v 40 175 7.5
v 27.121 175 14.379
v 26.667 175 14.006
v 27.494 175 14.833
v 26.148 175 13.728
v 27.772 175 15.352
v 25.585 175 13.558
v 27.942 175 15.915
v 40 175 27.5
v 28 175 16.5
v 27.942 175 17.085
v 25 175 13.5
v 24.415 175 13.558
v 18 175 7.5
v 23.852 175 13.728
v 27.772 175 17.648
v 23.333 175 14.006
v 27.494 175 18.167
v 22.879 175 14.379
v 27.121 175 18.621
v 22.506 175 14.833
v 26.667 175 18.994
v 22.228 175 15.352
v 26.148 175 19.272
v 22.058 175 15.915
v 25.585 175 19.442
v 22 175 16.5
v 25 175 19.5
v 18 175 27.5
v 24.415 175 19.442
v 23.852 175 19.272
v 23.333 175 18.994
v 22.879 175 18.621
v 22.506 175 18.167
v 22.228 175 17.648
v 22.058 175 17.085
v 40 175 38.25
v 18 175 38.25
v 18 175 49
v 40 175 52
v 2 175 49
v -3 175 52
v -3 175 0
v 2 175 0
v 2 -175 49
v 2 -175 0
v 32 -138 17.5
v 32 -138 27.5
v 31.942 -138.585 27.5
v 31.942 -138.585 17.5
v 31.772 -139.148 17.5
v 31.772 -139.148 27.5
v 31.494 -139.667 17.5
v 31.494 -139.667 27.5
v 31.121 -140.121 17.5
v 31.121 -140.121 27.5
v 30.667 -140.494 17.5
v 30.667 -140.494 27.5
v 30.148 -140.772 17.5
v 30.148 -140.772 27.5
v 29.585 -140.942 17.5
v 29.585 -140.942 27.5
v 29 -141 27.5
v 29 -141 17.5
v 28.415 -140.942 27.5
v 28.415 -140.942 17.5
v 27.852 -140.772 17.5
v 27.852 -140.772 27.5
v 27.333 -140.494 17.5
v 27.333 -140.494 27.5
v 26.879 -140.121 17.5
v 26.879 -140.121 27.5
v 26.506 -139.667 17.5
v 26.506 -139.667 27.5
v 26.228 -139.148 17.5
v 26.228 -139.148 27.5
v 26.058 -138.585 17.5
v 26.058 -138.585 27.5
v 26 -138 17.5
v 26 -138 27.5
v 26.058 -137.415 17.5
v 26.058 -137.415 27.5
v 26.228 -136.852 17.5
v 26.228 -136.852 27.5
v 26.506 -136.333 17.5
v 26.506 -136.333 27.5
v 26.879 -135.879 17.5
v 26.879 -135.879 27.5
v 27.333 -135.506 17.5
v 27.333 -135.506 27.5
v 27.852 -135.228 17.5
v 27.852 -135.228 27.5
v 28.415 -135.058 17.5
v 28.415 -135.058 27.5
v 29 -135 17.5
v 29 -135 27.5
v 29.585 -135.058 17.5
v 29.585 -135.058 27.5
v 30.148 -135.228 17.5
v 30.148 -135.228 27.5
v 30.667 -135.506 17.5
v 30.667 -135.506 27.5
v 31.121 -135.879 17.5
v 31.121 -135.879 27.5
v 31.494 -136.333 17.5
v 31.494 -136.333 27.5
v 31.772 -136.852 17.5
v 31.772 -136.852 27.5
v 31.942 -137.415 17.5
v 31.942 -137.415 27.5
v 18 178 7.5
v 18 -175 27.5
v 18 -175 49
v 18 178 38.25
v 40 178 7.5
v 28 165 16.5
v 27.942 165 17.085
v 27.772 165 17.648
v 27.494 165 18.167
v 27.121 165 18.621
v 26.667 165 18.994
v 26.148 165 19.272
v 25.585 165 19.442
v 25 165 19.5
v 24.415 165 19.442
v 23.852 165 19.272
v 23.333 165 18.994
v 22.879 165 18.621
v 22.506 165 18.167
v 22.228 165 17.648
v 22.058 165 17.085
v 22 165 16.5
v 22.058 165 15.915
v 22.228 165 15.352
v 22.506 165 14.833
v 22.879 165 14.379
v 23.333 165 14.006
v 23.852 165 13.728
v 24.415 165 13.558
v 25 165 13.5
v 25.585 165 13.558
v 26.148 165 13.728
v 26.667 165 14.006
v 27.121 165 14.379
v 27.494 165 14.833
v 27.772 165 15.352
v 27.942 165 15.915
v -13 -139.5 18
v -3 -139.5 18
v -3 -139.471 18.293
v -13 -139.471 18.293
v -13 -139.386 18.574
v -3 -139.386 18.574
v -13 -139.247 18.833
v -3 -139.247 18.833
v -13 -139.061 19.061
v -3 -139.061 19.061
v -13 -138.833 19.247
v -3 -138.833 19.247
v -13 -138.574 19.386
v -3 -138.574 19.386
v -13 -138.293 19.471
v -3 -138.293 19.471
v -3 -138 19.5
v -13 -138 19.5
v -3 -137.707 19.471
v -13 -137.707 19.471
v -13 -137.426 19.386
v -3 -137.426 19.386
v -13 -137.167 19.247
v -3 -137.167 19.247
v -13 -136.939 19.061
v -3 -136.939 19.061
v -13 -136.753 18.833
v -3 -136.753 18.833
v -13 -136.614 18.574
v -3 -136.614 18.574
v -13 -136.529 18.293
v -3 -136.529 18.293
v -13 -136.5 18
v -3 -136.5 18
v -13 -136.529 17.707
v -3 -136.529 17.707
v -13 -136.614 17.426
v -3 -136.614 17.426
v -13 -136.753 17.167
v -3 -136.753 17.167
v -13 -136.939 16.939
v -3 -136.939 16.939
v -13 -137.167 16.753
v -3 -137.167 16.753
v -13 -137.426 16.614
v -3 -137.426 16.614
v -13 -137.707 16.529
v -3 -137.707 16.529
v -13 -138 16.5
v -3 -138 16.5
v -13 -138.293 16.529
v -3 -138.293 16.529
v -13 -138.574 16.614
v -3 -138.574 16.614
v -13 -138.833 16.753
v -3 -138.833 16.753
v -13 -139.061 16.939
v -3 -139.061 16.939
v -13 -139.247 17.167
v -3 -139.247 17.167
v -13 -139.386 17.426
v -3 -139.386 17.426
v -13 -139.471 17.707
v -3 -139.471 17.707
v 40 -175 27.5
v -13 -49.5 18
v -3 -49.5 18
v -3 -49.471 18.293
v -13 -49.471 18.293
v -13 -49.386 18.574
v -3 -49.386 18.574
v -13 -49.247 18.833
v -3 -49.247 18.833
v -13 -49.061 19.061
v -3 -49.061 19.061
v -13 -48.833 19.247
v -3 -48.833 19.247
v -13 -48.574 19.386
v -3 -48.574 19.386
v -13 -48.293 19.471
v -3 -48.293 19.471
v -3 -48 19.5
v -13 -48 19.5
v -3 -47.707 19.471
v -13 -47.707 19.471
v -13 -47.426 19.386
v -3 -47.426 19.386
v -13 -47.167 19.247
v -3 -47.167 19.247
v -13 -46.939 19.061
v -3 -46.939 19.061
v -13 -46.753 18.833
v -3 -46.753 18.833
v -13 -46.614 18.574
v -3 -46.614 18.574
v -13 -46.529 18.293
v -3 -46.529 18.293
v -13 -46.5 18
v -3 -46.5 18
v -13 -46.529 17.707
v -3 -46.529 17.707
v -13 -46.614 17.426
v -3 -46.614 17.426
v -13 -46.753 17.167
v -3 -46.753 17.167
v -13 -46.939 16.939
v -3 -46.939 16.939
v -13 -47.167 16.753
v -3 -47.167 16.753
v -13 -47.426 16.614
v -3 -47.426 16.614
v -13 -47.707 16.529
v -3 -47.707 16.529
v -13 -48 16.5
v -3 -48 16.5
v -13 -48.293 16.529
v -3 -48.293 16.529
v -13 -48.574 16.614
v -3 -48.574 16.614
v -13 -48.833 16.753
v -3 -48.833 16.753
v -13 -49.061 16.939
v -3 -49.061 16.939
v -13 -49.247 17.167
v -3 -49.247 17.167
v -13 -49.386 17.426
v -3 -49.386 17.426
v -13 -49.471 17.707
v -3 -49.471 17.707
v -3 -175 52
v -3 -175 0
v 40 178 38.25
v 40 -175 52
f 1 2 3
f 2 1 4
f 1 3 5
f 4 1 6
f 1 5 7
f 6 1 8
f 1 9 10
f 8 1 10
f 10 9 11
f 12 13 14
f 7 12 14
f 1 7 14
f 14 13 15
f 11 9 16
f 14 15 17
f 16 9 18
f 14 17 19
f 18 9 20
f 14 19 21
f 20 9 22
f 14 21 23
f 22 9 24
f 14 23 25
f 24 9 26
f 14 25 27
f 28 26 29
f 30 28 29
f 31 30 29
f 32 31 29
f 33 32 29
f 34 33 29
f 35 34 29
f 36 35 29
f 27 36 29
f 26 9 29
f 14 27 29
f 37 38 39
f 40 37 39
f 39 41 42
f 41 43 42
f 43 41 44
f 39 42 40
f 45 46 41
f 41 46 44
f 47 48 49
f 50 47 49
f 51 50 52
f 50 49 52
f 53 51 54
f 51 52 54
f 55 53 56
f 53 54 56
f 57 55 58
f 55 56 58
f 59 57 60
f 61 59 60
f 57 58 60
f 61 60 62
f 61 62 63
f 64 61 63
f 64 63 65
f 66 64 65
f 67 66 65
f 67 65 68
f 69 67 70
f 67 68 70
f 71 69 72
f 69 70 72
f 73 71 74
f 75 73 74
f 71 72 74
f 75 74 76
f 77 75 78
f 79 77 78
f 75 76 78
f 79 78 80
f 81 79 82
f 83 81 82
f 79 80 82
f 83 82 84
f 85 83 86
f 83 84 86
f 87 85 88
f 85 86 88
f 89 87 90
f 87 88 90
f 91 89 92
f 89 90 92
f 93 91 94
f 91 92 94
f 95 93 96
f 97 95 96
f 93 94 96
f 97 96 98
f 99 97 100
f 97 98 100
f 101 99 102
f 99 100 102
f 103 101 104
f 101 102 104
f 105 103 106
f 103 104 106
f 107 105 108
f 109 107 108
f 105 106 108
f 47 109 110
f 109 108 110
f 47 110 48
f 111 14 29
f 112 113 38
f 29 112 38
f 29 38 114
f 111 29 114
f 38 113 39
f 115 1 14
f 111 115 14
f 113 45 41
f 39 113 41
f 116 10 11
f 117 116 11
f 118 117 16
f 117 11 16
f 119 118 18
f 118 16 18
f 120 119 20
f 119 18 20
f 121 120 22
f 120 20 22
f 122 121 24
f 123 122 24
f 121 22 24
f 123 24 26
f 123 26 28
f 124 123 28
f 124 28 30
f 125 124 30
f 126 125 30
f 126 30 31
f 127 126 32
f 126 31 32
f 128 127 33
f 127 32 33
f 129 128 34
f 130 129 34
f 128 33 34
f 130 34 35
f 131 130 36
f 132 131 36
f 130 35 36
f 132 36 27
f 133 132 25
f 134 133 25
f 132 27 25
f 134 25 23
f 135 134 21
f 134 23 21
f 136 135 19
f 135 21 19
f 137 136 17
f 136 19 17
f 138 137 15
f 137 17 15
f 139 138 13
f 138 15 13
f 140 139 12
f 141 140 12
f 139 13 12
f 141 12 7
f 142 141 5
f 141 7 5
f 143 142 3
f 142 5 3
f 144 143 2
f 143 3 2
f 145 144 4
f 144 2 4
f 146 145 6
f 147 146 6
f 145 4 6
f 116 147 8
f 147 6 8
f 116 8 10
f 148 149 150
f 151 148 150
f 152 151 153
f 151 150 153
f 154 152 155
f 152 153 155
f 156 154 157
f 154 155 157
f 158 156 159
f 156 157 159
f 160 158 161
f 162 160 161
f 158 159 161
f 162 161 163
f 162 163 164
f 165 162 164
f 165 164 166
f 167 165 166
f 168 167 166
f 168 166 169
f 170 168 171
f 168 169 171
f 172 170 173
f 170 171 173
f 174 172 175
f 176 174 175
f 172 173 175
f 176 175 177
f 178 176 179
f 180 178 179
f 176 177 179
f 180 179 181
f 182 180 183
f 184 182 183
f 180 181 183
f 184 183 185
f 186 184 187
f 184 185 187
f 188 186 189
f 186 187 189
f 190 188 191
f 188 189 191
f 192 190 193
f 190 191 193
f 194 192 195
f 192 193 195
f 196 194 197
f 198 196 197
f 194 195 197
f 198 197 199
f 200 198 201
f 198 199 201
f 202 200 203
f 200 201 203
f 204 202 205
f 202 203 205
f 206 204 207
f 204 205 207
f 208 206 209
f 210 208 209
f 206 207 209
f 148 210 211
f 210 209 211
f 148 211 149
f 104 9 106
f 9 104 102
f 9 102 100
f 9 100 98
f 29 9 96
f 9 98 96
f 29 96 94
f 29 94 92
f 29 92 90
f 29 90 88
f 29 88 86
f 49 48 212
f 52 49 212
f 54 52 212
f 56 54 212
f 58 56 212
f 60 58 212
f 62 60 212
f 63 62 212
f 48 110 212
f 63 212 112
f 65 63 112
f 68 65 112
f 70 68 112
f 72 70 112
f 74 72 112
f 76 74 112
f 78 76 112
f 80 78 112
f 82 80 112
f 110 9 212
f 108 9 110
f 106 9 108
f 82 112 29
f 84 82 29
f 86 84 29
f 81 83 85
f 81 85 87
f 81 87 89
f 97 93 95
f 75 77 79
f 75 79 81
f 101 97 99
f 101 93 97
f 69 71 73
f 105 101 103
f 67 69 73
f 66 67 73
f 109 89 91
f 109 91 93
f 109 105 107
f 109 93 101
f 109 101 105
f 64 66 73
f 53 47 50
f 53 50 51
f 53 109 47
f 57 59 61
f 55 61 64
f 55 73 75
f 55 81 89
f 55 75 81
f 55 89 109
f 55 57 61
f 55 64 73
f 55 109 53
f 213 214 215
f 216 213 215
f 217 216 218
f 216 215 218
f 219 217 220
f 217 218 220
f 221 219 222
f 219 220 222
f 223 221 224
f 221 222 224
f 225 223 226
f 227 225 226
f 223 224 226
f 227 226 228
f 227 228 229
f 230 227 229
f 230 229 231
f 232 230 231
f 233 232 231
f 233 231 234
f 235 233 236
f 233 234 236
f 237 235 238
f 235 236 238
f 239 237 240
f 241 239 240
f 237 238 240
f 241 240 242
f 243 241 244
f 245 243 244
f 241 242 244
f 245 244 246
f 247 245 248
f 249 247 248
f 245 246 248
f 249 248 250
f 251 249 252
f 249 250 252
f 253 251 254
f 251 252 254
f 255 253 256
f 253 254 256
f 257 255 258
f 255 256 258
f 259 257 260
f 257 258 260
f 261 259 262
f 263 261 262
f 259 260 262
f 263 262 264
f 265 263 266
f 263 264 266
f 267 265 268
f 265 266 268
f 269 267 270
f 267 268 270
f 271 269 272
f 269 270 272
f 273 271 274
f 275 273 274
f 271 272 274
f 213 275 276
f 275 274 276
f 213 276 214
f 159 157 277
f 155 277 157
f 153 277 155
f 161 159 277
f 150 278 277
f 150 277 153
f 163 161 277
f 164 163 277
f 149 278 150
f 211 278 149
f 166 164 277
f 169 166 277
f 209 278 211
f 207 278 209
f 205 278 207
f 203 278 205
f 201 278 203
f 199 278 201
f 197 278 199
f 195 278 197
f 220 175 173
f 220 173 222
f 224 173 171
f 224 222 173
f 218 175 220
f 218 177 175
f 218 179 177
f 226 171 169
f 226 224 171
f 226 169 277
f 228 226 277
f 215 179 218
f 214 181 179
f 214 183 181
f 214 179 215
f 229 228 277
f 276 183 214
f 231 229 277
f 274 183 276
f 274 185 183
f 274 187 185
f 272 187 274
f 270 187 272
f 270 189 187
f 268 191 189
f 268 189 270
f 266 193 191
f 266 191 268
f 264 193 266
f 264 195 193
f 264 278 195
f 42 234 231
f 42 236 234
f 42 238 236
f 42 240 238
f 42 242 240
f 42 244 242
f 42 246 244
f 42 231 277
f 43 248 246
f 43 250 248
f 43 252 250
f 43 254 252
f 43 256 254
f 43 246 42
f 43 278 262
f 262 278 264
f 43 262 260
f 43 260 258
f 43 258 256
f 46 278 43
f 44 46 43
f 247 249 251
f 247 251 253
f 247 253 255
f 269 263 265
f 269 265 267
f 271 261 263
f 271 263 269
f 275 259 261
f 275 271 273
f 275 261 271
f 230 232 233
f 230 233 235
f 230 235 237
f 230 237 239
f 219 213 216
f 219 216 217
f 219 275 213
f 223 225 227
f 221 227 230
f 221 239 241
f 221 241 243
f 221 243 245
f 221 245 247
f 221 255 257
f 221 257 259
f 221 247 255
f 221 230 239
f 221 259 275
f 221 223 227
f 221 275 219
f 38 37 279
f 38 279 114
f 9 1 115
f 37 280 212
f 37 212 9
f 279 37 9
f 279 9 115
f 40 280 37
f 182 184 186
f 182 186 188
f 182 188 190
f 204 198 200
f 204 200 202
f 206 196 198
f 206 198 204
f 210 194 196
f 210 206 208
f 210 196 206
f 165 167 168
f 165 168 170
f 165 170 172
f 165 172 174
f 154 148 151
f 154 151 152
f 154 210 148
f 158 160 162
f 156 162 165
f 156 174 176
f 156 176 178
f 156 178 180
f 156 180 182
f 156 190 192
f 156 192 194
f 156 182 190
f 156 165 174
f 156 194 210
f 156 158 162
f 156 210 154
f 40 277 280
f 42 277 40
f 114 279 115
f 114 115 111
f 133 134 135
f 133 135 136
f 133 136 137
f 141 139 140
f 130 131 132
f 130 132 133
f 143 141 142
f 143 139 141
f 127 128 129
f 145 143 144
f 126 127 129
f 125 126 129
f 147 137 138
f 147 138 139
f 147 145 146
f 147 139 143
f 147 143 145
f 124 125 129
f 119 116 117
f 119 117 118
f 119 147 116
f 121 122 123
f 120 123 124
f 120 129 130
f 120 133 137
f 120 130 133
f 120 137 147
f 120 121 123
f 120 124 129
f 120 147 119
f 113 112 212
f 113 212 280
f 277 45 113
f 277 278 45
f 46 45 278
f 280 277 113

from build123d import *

# Parameters (mm, degrees)
F0_W      = 3
F0_H      = 350
F1_DEPTH  = 52
F2_W      = 350
F2_H      = 3
F3_DEPTH  = 40
F4_W      = 22
F4_H      = 350
F5_DEPTH  = 21.5
F6_R      = 1.5
F7_DEPTH  = 10
F8_W      = 22
F8_H      = 10.75
F9_DEPTH  = 3
F10_DEPTH = 20
F11_R     = 3
F12_DEPTH = 10
F13_R     = 3
F14_DEPTH = 10
F15_DEPTH = 2


with BuildPart() as f1:
    # F0 (on Top) → F1 (new body)
    with BuildSketch(Plane.XY):
        with Locations((-1.5, 0)):
            Rectangle(F0_W, F0_H)
    extrude(amount=F1_DEPTH)

    # F2 (on face) → F3 (join)
    with BuildSketch(Plane.YZ):
        with Locations((0, 50.5)):
            Rectangle(F2_W, F2_H)
    extrude(amount=F3_DEPTH)

    # F4 (on face) → F5 (join)
    with BuildSketch(Plane(origin=(0, 0, 49), x_dir=(1, 0, 0), z_dir=(0, 0, -1))):
        with Locations((29, 0)):
            Rectangle(F4_W, F4_H)
    extrude(amount=F5_DEPTH)

    # F6 (on face) → F7 (join)
    with BuildSketch(Plane(origin=(-3, 0, 0), x_dir=(0, -1, 0), z_dir=(-1, 0, 0))):
        with Locations((138, 18)):
            Circle(F6_R)
        with Locations((48, 18)):
            Circle(F6_R)
    extrude(amount=F7_DEPTH)



with BuildPart() as f9:
    # F8 (on face) → F9 (new body)
    with BuildSketch(Plane(origin=(0, 175, 0), x_dir=(-1, 0, 0), z_dir=(0, 1, 0))):
        with Locations((-29, 32.875)):
            Rectangle(F8_W, F8_H)
    extrude(amount=F9_DEPTH)


with BuildPart() as f1_1:
    add(f1.part)
    # F10 (add): a face of the model
    f10_faces = [f9.part.faces().sort_by_distance(p)[0] for p in [
        (29, 176.5, 27.5),
    ]]

    add(f9.part)  # F10 merges F9
    extrude(f10_faces, amount=F10_DEPTH)

    # F11 (on face) → F12 (join)
    with BuildSketch(Plane.XZ.offset(-175)):
        with Locations((25, 16.5)):
            Circle(F11_R)
    extrude(amount=F12_DEPTH)

    # F13 (on face) → F14 (join)
    with BuildSketch(Plane(origin=(0, 0, 27.5), x_dir=(1, 0, 0), z_dir=(0, 0, -1))):
        with Locations((29, 138)):
            Circle(F13_R)
    extrude(amount=F14_DEPTH)

    # F15 (add): a face of the model
    f15_faces = [f1_1.faces().sort_by_distance(p)[0] for p in [
        (0, 0, 24.5),
    ]]
    extrude(f15_faces, amount=F15_DEPTH)


solid = f1_1.part
